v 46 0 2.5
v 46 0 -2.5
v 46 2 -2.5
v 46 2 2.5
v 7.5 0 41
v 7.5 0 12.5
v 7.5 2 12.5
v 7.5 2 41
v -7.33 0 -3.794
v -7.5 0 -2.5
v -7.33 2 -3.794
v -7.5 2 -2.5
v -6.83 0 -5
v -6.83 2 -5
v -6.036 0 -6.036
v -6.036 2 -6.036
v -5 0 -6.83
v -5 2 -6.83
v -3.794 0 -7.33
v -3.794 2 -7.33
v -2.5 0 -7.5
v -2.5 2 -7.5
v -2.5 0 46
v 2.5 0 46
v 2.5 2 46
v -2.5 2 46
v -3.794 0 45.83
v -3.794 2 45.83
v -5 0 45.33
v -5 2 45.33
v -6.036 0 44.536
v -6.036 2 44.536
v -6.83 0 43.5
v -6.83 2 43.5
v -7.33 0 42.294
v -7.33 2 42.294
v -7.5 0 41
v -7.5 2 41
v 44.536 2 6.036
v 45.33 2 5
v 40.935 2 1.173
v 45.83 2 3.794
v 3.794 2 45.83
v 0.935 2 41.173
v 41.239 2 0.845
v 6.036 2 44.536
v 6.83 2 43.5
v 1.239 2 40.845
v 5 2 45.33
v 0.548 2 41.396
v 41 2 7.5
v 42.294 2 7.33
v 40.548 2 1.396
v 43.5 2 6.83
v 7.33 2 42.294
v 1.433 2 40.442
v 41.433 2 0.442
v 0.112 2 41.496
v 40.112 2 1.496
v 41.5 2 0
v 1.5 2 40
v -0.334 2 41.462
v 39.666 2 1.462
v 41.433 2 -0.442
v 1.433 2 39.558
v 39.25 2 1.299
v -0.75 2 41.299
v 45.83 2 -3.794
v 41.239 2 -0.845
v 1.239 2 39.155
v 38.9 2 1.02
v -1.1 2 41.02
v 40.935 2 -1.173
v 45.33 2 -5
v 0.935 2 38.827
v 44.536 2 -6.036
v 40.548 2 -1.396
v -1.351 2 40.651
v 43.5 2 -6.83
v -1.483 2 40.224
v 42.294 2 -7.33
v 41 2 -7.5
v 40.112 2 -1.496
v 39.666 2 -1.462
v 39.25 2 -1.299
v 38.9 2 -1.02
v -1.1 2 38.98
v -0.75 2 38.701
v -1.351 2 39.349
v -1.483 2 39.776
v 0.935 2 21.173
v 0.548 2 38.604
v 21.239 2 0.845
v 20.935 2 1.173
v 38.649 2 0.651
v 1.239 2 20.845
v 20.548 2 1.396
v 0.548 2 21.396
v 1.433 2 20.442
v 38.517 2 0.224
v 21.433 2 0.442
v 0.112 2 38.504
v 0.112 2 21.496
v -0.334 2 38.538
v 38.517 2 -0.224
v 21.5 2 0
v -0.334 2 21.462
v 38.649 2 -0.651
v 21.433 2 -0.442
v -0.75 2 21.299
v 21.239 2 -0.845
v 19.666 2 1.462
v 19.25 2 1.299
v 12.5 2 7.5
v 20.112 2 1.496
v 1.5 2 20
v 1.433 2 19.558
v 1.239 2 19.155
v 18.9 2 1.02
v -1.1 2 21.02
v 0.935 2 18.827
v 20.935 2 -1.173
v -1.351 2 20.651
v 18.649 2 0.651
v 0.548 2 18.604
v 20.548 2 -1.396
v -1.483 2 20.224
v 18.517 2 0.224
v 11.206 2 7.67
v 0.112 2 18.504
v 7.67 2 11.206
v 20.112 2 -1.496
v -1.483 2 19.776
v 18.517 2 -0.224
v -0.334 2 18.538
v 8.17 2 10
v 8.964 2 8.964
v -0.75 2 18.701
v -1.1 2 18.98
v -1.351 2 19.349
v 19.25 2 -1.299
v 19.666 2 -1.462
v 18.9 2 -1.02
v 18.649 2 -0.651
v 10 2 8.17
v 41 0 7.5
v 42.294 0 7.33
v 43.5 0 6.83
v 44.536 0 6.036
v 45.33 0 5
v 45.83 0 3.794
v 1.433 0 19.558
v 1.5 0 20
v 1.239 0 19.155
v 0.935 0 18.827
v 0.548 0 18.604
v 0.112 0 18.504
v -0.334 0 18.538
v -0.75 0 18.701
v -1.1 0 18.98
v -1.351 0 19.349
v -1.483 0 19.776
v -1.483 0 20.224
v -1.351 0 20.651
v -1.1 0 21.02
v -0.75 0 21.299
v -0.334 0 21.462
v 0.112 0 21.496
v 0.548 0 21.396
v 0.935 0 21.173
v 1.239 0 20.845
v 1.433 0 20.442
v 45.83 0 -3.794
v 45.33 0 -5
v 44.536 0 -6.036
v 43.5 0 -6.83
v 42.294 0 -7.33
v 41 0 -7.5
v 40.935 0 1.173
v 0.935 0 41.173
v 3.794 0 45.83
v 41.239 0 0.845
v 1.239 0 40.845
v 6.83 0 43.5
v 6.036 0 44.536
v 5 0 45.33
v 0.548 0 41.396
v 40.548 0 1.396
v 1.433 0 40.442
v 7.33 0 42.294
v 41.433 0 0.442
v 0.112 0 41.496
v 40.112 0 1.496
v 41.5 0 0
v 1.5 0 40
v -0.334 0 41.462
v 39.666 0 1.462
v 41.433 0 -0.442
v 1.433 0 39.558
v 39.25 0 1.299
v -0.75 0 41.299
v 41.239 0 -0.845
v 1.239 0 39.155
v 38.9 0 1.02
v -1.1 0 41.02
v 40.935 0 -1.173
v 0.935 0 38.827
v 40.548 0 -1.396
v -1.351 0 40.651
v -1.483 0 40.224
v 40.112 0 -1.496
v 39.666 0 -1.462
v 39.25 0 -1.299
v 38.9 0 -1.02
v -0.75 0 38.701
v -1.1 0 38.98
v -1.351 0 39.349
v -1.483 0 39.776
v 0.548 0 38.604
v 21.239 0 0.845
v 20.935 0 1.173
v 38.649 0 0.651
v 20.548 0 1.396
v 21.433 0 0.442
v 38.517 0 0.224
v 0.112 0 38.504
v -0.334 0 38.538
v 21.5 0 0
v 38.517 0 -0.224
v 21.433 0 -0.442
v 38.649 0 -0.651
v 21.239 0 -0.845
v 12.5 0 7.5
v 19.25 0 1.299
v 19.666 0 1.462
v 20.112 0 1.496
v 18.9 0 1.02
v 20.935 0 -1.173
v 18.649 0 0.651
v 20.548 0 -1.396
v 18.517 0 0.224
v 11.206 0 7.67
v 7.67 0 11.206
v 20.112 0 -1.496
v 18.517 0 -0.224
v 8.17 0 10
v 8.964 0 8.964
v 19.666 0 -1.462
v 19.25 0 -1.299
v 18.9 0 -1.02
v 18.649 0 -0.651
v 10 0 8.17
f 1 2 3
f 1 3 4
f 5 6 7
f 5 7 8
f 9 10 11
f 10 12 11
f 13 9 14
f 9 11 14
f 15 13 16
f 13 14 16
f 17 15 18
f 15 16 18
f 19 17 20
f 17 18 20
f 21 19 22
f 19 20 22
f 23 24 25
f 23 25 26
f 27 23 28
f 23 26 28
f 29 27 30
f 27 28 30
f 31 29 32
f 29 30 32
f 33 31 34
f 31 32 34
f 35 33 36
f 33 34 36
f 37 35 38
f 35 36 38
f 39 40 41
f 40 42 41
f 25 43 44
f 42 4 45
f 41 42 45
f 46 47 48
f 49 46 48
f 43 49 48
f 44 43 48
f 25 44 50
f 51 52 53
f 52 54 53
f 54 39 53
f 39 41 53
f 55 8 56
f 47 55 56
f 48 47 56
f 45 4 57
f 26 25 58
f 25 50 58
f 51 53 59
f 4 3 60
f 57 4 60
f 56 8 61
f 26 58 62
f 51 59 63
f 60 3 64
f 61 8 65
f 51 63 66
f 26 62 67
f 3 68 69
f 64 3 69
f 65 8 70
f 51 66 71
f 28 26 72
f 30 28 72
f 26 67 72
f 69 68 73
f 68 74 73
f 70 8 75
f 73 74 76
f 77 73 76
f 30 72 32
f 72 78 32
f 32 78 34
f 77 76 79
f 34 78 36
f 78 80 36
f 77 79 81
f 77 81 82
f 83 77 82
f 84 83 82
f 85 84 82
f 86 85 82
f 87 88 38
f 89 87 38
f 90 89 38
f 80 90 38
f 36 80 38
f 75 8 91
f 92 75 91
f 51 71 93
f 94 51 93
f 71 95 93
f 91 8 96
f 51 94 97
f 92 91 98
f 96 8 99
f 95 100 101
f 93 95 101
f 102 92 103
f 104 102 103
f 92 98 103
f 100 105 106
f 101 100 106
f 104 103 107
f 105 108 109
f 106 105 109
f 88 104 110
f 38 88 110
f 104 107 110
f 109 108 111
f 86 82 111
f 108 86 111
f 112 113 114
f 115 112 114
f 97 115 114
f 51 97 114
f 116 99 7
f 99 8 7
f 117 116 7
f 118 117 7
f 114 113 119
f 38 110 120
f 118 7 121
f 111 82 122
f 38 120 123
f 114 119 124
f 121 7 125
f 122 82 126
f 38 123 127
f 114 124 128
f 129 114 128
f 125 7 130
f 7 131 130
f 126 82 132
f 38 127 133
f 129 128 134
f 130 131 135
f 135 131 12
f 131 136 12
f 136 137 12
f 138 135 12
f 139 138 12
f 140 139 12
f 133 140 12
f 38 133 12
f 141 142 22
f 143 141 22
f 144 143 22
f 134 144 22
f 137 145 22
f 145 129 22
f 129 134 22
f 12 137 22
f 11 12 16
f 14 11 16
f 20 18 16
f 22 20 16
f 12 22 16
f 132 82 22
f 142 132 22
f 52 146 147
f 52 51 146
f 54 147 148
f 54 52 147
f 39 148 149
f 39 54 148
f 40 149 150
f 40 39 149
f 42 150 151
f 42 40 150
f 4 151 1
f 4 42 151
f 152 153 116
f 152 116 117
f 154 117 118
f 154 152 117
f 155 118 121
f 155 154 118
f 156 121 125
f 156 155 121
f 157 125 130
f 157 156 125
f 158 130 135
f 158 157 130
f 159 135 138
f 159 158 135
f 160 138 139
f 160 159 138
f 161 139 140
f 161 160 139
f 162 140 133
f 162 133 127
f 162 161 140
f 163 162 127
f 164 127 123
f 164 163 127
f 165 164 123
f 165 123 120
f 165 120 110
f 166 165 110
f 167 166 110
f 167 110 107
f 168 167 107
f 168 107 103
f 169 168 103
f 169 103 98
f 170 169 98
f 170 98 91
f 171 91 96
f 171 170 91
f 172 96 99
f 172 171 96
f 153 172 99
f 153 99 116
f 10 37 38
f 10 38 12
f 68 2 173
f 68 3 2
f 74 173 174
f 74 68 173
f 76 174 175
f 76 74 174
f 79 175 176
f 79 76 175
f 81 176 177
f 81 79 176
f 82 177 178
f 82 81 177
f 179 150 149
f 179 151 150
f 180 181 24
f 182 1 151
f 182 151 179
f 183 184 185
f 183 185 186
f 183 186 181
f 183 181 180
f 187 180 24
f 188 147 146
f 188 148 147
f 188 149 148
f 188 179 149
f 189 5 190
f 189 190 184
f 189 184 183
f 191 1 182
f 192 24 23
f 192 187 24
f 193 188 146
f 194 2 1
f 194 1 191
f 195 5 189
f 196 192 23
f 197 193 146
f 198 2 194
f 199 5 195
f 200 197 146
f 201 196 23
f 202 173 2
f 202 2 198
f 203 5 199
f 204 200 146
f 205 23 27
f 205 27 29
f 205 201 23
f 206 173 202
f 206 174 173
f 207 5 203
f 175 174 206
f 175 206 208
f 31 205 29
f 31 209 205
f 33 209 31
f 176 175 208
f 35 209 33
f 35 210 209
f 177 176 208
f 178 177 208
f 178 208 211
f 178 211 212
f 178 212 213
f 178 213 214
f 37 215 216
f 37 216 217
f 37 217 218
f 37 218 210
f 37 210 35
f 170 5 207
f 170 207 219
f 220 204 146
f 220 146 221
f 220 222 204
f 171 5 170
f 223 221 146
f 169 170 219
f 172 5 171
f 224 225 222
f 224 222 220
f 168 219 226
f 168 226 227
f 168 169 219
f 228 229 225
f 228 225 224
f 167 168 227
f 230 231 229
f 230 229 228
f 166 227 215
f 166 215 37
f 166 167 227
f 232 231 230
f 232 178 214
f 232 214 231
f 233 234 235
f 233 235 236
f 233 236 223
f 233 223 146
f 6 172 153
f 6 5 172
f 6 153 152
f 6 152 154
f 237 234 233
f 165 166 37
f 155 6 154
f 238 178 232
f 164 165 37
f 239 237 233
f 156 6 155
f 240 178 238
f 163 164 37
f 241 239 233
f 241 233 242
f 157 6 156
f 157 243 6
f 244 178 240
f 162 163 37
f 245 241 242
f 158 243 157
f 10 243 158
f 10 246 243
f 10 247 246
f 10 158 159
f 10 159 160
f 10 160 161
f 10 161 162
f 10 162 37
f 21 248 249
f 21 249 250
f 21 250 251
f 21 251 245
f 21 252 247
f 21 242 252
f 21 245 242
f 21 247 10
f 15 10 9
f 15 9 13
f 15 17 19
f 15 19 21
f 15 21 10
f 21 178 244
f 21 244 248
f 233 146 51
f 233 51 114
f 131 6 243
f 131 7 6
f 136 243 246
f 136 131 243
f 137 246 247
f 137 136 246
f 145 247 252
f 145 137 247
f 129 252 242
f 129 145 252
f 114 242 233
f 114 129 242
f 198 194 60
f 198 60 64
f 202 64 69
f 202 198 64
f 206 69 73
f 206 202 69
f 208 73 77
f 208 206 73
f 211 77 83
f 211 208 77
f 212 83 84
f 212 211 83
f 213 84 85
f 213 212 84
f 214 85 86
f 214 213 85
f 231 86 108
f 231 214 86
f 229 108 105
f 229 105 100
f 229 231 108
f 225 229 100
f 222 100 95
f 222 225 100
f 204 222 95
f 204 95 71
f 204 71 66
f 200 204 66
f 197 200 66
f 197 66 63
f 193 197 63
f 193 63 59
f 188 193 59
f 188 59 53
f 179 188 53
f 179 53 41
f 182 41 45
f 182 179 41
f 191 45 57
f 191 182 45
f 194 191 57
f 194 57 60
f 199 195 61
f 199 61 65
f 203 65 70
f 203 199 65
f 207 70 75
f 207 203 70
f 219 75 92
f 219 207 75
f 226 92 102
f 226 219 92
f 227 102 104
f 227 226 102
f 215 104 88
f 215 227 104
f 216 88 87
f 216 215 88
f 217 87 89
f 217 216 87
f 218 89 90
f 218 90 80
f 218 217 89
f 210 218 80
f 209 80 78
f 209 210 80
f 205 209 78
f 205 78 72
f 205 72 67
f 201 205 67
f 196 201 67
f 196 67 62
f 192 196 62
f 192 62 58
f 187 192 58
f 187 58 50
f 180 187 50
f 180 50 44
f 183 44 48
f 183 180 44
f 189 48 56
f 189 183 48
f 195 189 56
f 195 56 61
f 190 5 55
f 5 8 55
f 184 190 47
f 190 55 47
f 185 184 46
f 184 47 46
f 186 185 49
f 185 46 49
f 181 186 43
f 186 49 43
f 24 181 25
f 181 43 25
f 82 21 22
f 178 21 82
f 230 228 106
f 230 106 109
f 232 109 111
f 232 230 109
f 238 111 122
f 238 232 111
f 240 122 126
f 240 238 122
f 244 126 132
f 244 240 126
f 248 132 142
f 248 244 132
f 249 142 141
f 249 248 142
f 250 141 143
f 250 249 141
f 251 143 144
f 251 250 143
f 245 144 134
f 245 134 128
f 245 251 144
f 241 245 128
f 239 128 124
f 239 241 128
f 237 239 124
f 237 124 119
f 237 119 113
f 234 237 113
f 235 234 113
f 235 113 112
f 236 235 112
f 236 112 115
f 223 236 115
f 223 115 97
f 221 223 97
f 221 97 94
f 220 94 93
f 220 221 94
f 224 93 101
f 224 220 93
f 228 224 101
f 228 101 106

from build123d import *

# Parameters (mm, degrees)
SKETCH1_R           = 1.5
BOSS_EXTRUDE1_DEPTH = 2
FILLET1_R           = 5


with BuildPart() as part:
    # Sketch1 → Boss-Extrude1 (new body)
    with BuildSketch(Plane(origin=(0, 0, 0), x_dir=(1, 0, 0), z_dir=(0, 1, 0))):
        Polygon((7.5, -7.5), (7.5, -46), (-7.5, -46), (-7.5, 7.5), (46, 7.5), (46, -7.5), align=None)
        with Locations((0, -40)):
            Circle(SKETCH1_R, mode=Mode.SUBTRACT)
        with Locations((0, -20)):
            Circle(SKETCH1_R, mode=Mode.SUBTRACT)
        with Locations((20, 0)):
            Circle(SKETCH1_R, mode=Mode.SUBTRACT)
        with Locations((40, 0)):
            Circle(SKETCH1_R, mode=Mode.SUBTRACT)
    extrude(amount=BOSS_EXTRUDE1_DEPTH)

    # Fillet1
    fillet1_edges = [part.edges().sort_by_distance(p)[0] for p in [
        (7.5, 1, 7.5),
        (7.5, 1, 46),
        (-7.5, 1, 46),
        (-7.5, 1, -7.5),
        (46, 1, -7.5),
        (46, 1, 7.5),
    ]]
    fillet(fillet1_edges, radius=FILLET1_R)


solid = part.part
